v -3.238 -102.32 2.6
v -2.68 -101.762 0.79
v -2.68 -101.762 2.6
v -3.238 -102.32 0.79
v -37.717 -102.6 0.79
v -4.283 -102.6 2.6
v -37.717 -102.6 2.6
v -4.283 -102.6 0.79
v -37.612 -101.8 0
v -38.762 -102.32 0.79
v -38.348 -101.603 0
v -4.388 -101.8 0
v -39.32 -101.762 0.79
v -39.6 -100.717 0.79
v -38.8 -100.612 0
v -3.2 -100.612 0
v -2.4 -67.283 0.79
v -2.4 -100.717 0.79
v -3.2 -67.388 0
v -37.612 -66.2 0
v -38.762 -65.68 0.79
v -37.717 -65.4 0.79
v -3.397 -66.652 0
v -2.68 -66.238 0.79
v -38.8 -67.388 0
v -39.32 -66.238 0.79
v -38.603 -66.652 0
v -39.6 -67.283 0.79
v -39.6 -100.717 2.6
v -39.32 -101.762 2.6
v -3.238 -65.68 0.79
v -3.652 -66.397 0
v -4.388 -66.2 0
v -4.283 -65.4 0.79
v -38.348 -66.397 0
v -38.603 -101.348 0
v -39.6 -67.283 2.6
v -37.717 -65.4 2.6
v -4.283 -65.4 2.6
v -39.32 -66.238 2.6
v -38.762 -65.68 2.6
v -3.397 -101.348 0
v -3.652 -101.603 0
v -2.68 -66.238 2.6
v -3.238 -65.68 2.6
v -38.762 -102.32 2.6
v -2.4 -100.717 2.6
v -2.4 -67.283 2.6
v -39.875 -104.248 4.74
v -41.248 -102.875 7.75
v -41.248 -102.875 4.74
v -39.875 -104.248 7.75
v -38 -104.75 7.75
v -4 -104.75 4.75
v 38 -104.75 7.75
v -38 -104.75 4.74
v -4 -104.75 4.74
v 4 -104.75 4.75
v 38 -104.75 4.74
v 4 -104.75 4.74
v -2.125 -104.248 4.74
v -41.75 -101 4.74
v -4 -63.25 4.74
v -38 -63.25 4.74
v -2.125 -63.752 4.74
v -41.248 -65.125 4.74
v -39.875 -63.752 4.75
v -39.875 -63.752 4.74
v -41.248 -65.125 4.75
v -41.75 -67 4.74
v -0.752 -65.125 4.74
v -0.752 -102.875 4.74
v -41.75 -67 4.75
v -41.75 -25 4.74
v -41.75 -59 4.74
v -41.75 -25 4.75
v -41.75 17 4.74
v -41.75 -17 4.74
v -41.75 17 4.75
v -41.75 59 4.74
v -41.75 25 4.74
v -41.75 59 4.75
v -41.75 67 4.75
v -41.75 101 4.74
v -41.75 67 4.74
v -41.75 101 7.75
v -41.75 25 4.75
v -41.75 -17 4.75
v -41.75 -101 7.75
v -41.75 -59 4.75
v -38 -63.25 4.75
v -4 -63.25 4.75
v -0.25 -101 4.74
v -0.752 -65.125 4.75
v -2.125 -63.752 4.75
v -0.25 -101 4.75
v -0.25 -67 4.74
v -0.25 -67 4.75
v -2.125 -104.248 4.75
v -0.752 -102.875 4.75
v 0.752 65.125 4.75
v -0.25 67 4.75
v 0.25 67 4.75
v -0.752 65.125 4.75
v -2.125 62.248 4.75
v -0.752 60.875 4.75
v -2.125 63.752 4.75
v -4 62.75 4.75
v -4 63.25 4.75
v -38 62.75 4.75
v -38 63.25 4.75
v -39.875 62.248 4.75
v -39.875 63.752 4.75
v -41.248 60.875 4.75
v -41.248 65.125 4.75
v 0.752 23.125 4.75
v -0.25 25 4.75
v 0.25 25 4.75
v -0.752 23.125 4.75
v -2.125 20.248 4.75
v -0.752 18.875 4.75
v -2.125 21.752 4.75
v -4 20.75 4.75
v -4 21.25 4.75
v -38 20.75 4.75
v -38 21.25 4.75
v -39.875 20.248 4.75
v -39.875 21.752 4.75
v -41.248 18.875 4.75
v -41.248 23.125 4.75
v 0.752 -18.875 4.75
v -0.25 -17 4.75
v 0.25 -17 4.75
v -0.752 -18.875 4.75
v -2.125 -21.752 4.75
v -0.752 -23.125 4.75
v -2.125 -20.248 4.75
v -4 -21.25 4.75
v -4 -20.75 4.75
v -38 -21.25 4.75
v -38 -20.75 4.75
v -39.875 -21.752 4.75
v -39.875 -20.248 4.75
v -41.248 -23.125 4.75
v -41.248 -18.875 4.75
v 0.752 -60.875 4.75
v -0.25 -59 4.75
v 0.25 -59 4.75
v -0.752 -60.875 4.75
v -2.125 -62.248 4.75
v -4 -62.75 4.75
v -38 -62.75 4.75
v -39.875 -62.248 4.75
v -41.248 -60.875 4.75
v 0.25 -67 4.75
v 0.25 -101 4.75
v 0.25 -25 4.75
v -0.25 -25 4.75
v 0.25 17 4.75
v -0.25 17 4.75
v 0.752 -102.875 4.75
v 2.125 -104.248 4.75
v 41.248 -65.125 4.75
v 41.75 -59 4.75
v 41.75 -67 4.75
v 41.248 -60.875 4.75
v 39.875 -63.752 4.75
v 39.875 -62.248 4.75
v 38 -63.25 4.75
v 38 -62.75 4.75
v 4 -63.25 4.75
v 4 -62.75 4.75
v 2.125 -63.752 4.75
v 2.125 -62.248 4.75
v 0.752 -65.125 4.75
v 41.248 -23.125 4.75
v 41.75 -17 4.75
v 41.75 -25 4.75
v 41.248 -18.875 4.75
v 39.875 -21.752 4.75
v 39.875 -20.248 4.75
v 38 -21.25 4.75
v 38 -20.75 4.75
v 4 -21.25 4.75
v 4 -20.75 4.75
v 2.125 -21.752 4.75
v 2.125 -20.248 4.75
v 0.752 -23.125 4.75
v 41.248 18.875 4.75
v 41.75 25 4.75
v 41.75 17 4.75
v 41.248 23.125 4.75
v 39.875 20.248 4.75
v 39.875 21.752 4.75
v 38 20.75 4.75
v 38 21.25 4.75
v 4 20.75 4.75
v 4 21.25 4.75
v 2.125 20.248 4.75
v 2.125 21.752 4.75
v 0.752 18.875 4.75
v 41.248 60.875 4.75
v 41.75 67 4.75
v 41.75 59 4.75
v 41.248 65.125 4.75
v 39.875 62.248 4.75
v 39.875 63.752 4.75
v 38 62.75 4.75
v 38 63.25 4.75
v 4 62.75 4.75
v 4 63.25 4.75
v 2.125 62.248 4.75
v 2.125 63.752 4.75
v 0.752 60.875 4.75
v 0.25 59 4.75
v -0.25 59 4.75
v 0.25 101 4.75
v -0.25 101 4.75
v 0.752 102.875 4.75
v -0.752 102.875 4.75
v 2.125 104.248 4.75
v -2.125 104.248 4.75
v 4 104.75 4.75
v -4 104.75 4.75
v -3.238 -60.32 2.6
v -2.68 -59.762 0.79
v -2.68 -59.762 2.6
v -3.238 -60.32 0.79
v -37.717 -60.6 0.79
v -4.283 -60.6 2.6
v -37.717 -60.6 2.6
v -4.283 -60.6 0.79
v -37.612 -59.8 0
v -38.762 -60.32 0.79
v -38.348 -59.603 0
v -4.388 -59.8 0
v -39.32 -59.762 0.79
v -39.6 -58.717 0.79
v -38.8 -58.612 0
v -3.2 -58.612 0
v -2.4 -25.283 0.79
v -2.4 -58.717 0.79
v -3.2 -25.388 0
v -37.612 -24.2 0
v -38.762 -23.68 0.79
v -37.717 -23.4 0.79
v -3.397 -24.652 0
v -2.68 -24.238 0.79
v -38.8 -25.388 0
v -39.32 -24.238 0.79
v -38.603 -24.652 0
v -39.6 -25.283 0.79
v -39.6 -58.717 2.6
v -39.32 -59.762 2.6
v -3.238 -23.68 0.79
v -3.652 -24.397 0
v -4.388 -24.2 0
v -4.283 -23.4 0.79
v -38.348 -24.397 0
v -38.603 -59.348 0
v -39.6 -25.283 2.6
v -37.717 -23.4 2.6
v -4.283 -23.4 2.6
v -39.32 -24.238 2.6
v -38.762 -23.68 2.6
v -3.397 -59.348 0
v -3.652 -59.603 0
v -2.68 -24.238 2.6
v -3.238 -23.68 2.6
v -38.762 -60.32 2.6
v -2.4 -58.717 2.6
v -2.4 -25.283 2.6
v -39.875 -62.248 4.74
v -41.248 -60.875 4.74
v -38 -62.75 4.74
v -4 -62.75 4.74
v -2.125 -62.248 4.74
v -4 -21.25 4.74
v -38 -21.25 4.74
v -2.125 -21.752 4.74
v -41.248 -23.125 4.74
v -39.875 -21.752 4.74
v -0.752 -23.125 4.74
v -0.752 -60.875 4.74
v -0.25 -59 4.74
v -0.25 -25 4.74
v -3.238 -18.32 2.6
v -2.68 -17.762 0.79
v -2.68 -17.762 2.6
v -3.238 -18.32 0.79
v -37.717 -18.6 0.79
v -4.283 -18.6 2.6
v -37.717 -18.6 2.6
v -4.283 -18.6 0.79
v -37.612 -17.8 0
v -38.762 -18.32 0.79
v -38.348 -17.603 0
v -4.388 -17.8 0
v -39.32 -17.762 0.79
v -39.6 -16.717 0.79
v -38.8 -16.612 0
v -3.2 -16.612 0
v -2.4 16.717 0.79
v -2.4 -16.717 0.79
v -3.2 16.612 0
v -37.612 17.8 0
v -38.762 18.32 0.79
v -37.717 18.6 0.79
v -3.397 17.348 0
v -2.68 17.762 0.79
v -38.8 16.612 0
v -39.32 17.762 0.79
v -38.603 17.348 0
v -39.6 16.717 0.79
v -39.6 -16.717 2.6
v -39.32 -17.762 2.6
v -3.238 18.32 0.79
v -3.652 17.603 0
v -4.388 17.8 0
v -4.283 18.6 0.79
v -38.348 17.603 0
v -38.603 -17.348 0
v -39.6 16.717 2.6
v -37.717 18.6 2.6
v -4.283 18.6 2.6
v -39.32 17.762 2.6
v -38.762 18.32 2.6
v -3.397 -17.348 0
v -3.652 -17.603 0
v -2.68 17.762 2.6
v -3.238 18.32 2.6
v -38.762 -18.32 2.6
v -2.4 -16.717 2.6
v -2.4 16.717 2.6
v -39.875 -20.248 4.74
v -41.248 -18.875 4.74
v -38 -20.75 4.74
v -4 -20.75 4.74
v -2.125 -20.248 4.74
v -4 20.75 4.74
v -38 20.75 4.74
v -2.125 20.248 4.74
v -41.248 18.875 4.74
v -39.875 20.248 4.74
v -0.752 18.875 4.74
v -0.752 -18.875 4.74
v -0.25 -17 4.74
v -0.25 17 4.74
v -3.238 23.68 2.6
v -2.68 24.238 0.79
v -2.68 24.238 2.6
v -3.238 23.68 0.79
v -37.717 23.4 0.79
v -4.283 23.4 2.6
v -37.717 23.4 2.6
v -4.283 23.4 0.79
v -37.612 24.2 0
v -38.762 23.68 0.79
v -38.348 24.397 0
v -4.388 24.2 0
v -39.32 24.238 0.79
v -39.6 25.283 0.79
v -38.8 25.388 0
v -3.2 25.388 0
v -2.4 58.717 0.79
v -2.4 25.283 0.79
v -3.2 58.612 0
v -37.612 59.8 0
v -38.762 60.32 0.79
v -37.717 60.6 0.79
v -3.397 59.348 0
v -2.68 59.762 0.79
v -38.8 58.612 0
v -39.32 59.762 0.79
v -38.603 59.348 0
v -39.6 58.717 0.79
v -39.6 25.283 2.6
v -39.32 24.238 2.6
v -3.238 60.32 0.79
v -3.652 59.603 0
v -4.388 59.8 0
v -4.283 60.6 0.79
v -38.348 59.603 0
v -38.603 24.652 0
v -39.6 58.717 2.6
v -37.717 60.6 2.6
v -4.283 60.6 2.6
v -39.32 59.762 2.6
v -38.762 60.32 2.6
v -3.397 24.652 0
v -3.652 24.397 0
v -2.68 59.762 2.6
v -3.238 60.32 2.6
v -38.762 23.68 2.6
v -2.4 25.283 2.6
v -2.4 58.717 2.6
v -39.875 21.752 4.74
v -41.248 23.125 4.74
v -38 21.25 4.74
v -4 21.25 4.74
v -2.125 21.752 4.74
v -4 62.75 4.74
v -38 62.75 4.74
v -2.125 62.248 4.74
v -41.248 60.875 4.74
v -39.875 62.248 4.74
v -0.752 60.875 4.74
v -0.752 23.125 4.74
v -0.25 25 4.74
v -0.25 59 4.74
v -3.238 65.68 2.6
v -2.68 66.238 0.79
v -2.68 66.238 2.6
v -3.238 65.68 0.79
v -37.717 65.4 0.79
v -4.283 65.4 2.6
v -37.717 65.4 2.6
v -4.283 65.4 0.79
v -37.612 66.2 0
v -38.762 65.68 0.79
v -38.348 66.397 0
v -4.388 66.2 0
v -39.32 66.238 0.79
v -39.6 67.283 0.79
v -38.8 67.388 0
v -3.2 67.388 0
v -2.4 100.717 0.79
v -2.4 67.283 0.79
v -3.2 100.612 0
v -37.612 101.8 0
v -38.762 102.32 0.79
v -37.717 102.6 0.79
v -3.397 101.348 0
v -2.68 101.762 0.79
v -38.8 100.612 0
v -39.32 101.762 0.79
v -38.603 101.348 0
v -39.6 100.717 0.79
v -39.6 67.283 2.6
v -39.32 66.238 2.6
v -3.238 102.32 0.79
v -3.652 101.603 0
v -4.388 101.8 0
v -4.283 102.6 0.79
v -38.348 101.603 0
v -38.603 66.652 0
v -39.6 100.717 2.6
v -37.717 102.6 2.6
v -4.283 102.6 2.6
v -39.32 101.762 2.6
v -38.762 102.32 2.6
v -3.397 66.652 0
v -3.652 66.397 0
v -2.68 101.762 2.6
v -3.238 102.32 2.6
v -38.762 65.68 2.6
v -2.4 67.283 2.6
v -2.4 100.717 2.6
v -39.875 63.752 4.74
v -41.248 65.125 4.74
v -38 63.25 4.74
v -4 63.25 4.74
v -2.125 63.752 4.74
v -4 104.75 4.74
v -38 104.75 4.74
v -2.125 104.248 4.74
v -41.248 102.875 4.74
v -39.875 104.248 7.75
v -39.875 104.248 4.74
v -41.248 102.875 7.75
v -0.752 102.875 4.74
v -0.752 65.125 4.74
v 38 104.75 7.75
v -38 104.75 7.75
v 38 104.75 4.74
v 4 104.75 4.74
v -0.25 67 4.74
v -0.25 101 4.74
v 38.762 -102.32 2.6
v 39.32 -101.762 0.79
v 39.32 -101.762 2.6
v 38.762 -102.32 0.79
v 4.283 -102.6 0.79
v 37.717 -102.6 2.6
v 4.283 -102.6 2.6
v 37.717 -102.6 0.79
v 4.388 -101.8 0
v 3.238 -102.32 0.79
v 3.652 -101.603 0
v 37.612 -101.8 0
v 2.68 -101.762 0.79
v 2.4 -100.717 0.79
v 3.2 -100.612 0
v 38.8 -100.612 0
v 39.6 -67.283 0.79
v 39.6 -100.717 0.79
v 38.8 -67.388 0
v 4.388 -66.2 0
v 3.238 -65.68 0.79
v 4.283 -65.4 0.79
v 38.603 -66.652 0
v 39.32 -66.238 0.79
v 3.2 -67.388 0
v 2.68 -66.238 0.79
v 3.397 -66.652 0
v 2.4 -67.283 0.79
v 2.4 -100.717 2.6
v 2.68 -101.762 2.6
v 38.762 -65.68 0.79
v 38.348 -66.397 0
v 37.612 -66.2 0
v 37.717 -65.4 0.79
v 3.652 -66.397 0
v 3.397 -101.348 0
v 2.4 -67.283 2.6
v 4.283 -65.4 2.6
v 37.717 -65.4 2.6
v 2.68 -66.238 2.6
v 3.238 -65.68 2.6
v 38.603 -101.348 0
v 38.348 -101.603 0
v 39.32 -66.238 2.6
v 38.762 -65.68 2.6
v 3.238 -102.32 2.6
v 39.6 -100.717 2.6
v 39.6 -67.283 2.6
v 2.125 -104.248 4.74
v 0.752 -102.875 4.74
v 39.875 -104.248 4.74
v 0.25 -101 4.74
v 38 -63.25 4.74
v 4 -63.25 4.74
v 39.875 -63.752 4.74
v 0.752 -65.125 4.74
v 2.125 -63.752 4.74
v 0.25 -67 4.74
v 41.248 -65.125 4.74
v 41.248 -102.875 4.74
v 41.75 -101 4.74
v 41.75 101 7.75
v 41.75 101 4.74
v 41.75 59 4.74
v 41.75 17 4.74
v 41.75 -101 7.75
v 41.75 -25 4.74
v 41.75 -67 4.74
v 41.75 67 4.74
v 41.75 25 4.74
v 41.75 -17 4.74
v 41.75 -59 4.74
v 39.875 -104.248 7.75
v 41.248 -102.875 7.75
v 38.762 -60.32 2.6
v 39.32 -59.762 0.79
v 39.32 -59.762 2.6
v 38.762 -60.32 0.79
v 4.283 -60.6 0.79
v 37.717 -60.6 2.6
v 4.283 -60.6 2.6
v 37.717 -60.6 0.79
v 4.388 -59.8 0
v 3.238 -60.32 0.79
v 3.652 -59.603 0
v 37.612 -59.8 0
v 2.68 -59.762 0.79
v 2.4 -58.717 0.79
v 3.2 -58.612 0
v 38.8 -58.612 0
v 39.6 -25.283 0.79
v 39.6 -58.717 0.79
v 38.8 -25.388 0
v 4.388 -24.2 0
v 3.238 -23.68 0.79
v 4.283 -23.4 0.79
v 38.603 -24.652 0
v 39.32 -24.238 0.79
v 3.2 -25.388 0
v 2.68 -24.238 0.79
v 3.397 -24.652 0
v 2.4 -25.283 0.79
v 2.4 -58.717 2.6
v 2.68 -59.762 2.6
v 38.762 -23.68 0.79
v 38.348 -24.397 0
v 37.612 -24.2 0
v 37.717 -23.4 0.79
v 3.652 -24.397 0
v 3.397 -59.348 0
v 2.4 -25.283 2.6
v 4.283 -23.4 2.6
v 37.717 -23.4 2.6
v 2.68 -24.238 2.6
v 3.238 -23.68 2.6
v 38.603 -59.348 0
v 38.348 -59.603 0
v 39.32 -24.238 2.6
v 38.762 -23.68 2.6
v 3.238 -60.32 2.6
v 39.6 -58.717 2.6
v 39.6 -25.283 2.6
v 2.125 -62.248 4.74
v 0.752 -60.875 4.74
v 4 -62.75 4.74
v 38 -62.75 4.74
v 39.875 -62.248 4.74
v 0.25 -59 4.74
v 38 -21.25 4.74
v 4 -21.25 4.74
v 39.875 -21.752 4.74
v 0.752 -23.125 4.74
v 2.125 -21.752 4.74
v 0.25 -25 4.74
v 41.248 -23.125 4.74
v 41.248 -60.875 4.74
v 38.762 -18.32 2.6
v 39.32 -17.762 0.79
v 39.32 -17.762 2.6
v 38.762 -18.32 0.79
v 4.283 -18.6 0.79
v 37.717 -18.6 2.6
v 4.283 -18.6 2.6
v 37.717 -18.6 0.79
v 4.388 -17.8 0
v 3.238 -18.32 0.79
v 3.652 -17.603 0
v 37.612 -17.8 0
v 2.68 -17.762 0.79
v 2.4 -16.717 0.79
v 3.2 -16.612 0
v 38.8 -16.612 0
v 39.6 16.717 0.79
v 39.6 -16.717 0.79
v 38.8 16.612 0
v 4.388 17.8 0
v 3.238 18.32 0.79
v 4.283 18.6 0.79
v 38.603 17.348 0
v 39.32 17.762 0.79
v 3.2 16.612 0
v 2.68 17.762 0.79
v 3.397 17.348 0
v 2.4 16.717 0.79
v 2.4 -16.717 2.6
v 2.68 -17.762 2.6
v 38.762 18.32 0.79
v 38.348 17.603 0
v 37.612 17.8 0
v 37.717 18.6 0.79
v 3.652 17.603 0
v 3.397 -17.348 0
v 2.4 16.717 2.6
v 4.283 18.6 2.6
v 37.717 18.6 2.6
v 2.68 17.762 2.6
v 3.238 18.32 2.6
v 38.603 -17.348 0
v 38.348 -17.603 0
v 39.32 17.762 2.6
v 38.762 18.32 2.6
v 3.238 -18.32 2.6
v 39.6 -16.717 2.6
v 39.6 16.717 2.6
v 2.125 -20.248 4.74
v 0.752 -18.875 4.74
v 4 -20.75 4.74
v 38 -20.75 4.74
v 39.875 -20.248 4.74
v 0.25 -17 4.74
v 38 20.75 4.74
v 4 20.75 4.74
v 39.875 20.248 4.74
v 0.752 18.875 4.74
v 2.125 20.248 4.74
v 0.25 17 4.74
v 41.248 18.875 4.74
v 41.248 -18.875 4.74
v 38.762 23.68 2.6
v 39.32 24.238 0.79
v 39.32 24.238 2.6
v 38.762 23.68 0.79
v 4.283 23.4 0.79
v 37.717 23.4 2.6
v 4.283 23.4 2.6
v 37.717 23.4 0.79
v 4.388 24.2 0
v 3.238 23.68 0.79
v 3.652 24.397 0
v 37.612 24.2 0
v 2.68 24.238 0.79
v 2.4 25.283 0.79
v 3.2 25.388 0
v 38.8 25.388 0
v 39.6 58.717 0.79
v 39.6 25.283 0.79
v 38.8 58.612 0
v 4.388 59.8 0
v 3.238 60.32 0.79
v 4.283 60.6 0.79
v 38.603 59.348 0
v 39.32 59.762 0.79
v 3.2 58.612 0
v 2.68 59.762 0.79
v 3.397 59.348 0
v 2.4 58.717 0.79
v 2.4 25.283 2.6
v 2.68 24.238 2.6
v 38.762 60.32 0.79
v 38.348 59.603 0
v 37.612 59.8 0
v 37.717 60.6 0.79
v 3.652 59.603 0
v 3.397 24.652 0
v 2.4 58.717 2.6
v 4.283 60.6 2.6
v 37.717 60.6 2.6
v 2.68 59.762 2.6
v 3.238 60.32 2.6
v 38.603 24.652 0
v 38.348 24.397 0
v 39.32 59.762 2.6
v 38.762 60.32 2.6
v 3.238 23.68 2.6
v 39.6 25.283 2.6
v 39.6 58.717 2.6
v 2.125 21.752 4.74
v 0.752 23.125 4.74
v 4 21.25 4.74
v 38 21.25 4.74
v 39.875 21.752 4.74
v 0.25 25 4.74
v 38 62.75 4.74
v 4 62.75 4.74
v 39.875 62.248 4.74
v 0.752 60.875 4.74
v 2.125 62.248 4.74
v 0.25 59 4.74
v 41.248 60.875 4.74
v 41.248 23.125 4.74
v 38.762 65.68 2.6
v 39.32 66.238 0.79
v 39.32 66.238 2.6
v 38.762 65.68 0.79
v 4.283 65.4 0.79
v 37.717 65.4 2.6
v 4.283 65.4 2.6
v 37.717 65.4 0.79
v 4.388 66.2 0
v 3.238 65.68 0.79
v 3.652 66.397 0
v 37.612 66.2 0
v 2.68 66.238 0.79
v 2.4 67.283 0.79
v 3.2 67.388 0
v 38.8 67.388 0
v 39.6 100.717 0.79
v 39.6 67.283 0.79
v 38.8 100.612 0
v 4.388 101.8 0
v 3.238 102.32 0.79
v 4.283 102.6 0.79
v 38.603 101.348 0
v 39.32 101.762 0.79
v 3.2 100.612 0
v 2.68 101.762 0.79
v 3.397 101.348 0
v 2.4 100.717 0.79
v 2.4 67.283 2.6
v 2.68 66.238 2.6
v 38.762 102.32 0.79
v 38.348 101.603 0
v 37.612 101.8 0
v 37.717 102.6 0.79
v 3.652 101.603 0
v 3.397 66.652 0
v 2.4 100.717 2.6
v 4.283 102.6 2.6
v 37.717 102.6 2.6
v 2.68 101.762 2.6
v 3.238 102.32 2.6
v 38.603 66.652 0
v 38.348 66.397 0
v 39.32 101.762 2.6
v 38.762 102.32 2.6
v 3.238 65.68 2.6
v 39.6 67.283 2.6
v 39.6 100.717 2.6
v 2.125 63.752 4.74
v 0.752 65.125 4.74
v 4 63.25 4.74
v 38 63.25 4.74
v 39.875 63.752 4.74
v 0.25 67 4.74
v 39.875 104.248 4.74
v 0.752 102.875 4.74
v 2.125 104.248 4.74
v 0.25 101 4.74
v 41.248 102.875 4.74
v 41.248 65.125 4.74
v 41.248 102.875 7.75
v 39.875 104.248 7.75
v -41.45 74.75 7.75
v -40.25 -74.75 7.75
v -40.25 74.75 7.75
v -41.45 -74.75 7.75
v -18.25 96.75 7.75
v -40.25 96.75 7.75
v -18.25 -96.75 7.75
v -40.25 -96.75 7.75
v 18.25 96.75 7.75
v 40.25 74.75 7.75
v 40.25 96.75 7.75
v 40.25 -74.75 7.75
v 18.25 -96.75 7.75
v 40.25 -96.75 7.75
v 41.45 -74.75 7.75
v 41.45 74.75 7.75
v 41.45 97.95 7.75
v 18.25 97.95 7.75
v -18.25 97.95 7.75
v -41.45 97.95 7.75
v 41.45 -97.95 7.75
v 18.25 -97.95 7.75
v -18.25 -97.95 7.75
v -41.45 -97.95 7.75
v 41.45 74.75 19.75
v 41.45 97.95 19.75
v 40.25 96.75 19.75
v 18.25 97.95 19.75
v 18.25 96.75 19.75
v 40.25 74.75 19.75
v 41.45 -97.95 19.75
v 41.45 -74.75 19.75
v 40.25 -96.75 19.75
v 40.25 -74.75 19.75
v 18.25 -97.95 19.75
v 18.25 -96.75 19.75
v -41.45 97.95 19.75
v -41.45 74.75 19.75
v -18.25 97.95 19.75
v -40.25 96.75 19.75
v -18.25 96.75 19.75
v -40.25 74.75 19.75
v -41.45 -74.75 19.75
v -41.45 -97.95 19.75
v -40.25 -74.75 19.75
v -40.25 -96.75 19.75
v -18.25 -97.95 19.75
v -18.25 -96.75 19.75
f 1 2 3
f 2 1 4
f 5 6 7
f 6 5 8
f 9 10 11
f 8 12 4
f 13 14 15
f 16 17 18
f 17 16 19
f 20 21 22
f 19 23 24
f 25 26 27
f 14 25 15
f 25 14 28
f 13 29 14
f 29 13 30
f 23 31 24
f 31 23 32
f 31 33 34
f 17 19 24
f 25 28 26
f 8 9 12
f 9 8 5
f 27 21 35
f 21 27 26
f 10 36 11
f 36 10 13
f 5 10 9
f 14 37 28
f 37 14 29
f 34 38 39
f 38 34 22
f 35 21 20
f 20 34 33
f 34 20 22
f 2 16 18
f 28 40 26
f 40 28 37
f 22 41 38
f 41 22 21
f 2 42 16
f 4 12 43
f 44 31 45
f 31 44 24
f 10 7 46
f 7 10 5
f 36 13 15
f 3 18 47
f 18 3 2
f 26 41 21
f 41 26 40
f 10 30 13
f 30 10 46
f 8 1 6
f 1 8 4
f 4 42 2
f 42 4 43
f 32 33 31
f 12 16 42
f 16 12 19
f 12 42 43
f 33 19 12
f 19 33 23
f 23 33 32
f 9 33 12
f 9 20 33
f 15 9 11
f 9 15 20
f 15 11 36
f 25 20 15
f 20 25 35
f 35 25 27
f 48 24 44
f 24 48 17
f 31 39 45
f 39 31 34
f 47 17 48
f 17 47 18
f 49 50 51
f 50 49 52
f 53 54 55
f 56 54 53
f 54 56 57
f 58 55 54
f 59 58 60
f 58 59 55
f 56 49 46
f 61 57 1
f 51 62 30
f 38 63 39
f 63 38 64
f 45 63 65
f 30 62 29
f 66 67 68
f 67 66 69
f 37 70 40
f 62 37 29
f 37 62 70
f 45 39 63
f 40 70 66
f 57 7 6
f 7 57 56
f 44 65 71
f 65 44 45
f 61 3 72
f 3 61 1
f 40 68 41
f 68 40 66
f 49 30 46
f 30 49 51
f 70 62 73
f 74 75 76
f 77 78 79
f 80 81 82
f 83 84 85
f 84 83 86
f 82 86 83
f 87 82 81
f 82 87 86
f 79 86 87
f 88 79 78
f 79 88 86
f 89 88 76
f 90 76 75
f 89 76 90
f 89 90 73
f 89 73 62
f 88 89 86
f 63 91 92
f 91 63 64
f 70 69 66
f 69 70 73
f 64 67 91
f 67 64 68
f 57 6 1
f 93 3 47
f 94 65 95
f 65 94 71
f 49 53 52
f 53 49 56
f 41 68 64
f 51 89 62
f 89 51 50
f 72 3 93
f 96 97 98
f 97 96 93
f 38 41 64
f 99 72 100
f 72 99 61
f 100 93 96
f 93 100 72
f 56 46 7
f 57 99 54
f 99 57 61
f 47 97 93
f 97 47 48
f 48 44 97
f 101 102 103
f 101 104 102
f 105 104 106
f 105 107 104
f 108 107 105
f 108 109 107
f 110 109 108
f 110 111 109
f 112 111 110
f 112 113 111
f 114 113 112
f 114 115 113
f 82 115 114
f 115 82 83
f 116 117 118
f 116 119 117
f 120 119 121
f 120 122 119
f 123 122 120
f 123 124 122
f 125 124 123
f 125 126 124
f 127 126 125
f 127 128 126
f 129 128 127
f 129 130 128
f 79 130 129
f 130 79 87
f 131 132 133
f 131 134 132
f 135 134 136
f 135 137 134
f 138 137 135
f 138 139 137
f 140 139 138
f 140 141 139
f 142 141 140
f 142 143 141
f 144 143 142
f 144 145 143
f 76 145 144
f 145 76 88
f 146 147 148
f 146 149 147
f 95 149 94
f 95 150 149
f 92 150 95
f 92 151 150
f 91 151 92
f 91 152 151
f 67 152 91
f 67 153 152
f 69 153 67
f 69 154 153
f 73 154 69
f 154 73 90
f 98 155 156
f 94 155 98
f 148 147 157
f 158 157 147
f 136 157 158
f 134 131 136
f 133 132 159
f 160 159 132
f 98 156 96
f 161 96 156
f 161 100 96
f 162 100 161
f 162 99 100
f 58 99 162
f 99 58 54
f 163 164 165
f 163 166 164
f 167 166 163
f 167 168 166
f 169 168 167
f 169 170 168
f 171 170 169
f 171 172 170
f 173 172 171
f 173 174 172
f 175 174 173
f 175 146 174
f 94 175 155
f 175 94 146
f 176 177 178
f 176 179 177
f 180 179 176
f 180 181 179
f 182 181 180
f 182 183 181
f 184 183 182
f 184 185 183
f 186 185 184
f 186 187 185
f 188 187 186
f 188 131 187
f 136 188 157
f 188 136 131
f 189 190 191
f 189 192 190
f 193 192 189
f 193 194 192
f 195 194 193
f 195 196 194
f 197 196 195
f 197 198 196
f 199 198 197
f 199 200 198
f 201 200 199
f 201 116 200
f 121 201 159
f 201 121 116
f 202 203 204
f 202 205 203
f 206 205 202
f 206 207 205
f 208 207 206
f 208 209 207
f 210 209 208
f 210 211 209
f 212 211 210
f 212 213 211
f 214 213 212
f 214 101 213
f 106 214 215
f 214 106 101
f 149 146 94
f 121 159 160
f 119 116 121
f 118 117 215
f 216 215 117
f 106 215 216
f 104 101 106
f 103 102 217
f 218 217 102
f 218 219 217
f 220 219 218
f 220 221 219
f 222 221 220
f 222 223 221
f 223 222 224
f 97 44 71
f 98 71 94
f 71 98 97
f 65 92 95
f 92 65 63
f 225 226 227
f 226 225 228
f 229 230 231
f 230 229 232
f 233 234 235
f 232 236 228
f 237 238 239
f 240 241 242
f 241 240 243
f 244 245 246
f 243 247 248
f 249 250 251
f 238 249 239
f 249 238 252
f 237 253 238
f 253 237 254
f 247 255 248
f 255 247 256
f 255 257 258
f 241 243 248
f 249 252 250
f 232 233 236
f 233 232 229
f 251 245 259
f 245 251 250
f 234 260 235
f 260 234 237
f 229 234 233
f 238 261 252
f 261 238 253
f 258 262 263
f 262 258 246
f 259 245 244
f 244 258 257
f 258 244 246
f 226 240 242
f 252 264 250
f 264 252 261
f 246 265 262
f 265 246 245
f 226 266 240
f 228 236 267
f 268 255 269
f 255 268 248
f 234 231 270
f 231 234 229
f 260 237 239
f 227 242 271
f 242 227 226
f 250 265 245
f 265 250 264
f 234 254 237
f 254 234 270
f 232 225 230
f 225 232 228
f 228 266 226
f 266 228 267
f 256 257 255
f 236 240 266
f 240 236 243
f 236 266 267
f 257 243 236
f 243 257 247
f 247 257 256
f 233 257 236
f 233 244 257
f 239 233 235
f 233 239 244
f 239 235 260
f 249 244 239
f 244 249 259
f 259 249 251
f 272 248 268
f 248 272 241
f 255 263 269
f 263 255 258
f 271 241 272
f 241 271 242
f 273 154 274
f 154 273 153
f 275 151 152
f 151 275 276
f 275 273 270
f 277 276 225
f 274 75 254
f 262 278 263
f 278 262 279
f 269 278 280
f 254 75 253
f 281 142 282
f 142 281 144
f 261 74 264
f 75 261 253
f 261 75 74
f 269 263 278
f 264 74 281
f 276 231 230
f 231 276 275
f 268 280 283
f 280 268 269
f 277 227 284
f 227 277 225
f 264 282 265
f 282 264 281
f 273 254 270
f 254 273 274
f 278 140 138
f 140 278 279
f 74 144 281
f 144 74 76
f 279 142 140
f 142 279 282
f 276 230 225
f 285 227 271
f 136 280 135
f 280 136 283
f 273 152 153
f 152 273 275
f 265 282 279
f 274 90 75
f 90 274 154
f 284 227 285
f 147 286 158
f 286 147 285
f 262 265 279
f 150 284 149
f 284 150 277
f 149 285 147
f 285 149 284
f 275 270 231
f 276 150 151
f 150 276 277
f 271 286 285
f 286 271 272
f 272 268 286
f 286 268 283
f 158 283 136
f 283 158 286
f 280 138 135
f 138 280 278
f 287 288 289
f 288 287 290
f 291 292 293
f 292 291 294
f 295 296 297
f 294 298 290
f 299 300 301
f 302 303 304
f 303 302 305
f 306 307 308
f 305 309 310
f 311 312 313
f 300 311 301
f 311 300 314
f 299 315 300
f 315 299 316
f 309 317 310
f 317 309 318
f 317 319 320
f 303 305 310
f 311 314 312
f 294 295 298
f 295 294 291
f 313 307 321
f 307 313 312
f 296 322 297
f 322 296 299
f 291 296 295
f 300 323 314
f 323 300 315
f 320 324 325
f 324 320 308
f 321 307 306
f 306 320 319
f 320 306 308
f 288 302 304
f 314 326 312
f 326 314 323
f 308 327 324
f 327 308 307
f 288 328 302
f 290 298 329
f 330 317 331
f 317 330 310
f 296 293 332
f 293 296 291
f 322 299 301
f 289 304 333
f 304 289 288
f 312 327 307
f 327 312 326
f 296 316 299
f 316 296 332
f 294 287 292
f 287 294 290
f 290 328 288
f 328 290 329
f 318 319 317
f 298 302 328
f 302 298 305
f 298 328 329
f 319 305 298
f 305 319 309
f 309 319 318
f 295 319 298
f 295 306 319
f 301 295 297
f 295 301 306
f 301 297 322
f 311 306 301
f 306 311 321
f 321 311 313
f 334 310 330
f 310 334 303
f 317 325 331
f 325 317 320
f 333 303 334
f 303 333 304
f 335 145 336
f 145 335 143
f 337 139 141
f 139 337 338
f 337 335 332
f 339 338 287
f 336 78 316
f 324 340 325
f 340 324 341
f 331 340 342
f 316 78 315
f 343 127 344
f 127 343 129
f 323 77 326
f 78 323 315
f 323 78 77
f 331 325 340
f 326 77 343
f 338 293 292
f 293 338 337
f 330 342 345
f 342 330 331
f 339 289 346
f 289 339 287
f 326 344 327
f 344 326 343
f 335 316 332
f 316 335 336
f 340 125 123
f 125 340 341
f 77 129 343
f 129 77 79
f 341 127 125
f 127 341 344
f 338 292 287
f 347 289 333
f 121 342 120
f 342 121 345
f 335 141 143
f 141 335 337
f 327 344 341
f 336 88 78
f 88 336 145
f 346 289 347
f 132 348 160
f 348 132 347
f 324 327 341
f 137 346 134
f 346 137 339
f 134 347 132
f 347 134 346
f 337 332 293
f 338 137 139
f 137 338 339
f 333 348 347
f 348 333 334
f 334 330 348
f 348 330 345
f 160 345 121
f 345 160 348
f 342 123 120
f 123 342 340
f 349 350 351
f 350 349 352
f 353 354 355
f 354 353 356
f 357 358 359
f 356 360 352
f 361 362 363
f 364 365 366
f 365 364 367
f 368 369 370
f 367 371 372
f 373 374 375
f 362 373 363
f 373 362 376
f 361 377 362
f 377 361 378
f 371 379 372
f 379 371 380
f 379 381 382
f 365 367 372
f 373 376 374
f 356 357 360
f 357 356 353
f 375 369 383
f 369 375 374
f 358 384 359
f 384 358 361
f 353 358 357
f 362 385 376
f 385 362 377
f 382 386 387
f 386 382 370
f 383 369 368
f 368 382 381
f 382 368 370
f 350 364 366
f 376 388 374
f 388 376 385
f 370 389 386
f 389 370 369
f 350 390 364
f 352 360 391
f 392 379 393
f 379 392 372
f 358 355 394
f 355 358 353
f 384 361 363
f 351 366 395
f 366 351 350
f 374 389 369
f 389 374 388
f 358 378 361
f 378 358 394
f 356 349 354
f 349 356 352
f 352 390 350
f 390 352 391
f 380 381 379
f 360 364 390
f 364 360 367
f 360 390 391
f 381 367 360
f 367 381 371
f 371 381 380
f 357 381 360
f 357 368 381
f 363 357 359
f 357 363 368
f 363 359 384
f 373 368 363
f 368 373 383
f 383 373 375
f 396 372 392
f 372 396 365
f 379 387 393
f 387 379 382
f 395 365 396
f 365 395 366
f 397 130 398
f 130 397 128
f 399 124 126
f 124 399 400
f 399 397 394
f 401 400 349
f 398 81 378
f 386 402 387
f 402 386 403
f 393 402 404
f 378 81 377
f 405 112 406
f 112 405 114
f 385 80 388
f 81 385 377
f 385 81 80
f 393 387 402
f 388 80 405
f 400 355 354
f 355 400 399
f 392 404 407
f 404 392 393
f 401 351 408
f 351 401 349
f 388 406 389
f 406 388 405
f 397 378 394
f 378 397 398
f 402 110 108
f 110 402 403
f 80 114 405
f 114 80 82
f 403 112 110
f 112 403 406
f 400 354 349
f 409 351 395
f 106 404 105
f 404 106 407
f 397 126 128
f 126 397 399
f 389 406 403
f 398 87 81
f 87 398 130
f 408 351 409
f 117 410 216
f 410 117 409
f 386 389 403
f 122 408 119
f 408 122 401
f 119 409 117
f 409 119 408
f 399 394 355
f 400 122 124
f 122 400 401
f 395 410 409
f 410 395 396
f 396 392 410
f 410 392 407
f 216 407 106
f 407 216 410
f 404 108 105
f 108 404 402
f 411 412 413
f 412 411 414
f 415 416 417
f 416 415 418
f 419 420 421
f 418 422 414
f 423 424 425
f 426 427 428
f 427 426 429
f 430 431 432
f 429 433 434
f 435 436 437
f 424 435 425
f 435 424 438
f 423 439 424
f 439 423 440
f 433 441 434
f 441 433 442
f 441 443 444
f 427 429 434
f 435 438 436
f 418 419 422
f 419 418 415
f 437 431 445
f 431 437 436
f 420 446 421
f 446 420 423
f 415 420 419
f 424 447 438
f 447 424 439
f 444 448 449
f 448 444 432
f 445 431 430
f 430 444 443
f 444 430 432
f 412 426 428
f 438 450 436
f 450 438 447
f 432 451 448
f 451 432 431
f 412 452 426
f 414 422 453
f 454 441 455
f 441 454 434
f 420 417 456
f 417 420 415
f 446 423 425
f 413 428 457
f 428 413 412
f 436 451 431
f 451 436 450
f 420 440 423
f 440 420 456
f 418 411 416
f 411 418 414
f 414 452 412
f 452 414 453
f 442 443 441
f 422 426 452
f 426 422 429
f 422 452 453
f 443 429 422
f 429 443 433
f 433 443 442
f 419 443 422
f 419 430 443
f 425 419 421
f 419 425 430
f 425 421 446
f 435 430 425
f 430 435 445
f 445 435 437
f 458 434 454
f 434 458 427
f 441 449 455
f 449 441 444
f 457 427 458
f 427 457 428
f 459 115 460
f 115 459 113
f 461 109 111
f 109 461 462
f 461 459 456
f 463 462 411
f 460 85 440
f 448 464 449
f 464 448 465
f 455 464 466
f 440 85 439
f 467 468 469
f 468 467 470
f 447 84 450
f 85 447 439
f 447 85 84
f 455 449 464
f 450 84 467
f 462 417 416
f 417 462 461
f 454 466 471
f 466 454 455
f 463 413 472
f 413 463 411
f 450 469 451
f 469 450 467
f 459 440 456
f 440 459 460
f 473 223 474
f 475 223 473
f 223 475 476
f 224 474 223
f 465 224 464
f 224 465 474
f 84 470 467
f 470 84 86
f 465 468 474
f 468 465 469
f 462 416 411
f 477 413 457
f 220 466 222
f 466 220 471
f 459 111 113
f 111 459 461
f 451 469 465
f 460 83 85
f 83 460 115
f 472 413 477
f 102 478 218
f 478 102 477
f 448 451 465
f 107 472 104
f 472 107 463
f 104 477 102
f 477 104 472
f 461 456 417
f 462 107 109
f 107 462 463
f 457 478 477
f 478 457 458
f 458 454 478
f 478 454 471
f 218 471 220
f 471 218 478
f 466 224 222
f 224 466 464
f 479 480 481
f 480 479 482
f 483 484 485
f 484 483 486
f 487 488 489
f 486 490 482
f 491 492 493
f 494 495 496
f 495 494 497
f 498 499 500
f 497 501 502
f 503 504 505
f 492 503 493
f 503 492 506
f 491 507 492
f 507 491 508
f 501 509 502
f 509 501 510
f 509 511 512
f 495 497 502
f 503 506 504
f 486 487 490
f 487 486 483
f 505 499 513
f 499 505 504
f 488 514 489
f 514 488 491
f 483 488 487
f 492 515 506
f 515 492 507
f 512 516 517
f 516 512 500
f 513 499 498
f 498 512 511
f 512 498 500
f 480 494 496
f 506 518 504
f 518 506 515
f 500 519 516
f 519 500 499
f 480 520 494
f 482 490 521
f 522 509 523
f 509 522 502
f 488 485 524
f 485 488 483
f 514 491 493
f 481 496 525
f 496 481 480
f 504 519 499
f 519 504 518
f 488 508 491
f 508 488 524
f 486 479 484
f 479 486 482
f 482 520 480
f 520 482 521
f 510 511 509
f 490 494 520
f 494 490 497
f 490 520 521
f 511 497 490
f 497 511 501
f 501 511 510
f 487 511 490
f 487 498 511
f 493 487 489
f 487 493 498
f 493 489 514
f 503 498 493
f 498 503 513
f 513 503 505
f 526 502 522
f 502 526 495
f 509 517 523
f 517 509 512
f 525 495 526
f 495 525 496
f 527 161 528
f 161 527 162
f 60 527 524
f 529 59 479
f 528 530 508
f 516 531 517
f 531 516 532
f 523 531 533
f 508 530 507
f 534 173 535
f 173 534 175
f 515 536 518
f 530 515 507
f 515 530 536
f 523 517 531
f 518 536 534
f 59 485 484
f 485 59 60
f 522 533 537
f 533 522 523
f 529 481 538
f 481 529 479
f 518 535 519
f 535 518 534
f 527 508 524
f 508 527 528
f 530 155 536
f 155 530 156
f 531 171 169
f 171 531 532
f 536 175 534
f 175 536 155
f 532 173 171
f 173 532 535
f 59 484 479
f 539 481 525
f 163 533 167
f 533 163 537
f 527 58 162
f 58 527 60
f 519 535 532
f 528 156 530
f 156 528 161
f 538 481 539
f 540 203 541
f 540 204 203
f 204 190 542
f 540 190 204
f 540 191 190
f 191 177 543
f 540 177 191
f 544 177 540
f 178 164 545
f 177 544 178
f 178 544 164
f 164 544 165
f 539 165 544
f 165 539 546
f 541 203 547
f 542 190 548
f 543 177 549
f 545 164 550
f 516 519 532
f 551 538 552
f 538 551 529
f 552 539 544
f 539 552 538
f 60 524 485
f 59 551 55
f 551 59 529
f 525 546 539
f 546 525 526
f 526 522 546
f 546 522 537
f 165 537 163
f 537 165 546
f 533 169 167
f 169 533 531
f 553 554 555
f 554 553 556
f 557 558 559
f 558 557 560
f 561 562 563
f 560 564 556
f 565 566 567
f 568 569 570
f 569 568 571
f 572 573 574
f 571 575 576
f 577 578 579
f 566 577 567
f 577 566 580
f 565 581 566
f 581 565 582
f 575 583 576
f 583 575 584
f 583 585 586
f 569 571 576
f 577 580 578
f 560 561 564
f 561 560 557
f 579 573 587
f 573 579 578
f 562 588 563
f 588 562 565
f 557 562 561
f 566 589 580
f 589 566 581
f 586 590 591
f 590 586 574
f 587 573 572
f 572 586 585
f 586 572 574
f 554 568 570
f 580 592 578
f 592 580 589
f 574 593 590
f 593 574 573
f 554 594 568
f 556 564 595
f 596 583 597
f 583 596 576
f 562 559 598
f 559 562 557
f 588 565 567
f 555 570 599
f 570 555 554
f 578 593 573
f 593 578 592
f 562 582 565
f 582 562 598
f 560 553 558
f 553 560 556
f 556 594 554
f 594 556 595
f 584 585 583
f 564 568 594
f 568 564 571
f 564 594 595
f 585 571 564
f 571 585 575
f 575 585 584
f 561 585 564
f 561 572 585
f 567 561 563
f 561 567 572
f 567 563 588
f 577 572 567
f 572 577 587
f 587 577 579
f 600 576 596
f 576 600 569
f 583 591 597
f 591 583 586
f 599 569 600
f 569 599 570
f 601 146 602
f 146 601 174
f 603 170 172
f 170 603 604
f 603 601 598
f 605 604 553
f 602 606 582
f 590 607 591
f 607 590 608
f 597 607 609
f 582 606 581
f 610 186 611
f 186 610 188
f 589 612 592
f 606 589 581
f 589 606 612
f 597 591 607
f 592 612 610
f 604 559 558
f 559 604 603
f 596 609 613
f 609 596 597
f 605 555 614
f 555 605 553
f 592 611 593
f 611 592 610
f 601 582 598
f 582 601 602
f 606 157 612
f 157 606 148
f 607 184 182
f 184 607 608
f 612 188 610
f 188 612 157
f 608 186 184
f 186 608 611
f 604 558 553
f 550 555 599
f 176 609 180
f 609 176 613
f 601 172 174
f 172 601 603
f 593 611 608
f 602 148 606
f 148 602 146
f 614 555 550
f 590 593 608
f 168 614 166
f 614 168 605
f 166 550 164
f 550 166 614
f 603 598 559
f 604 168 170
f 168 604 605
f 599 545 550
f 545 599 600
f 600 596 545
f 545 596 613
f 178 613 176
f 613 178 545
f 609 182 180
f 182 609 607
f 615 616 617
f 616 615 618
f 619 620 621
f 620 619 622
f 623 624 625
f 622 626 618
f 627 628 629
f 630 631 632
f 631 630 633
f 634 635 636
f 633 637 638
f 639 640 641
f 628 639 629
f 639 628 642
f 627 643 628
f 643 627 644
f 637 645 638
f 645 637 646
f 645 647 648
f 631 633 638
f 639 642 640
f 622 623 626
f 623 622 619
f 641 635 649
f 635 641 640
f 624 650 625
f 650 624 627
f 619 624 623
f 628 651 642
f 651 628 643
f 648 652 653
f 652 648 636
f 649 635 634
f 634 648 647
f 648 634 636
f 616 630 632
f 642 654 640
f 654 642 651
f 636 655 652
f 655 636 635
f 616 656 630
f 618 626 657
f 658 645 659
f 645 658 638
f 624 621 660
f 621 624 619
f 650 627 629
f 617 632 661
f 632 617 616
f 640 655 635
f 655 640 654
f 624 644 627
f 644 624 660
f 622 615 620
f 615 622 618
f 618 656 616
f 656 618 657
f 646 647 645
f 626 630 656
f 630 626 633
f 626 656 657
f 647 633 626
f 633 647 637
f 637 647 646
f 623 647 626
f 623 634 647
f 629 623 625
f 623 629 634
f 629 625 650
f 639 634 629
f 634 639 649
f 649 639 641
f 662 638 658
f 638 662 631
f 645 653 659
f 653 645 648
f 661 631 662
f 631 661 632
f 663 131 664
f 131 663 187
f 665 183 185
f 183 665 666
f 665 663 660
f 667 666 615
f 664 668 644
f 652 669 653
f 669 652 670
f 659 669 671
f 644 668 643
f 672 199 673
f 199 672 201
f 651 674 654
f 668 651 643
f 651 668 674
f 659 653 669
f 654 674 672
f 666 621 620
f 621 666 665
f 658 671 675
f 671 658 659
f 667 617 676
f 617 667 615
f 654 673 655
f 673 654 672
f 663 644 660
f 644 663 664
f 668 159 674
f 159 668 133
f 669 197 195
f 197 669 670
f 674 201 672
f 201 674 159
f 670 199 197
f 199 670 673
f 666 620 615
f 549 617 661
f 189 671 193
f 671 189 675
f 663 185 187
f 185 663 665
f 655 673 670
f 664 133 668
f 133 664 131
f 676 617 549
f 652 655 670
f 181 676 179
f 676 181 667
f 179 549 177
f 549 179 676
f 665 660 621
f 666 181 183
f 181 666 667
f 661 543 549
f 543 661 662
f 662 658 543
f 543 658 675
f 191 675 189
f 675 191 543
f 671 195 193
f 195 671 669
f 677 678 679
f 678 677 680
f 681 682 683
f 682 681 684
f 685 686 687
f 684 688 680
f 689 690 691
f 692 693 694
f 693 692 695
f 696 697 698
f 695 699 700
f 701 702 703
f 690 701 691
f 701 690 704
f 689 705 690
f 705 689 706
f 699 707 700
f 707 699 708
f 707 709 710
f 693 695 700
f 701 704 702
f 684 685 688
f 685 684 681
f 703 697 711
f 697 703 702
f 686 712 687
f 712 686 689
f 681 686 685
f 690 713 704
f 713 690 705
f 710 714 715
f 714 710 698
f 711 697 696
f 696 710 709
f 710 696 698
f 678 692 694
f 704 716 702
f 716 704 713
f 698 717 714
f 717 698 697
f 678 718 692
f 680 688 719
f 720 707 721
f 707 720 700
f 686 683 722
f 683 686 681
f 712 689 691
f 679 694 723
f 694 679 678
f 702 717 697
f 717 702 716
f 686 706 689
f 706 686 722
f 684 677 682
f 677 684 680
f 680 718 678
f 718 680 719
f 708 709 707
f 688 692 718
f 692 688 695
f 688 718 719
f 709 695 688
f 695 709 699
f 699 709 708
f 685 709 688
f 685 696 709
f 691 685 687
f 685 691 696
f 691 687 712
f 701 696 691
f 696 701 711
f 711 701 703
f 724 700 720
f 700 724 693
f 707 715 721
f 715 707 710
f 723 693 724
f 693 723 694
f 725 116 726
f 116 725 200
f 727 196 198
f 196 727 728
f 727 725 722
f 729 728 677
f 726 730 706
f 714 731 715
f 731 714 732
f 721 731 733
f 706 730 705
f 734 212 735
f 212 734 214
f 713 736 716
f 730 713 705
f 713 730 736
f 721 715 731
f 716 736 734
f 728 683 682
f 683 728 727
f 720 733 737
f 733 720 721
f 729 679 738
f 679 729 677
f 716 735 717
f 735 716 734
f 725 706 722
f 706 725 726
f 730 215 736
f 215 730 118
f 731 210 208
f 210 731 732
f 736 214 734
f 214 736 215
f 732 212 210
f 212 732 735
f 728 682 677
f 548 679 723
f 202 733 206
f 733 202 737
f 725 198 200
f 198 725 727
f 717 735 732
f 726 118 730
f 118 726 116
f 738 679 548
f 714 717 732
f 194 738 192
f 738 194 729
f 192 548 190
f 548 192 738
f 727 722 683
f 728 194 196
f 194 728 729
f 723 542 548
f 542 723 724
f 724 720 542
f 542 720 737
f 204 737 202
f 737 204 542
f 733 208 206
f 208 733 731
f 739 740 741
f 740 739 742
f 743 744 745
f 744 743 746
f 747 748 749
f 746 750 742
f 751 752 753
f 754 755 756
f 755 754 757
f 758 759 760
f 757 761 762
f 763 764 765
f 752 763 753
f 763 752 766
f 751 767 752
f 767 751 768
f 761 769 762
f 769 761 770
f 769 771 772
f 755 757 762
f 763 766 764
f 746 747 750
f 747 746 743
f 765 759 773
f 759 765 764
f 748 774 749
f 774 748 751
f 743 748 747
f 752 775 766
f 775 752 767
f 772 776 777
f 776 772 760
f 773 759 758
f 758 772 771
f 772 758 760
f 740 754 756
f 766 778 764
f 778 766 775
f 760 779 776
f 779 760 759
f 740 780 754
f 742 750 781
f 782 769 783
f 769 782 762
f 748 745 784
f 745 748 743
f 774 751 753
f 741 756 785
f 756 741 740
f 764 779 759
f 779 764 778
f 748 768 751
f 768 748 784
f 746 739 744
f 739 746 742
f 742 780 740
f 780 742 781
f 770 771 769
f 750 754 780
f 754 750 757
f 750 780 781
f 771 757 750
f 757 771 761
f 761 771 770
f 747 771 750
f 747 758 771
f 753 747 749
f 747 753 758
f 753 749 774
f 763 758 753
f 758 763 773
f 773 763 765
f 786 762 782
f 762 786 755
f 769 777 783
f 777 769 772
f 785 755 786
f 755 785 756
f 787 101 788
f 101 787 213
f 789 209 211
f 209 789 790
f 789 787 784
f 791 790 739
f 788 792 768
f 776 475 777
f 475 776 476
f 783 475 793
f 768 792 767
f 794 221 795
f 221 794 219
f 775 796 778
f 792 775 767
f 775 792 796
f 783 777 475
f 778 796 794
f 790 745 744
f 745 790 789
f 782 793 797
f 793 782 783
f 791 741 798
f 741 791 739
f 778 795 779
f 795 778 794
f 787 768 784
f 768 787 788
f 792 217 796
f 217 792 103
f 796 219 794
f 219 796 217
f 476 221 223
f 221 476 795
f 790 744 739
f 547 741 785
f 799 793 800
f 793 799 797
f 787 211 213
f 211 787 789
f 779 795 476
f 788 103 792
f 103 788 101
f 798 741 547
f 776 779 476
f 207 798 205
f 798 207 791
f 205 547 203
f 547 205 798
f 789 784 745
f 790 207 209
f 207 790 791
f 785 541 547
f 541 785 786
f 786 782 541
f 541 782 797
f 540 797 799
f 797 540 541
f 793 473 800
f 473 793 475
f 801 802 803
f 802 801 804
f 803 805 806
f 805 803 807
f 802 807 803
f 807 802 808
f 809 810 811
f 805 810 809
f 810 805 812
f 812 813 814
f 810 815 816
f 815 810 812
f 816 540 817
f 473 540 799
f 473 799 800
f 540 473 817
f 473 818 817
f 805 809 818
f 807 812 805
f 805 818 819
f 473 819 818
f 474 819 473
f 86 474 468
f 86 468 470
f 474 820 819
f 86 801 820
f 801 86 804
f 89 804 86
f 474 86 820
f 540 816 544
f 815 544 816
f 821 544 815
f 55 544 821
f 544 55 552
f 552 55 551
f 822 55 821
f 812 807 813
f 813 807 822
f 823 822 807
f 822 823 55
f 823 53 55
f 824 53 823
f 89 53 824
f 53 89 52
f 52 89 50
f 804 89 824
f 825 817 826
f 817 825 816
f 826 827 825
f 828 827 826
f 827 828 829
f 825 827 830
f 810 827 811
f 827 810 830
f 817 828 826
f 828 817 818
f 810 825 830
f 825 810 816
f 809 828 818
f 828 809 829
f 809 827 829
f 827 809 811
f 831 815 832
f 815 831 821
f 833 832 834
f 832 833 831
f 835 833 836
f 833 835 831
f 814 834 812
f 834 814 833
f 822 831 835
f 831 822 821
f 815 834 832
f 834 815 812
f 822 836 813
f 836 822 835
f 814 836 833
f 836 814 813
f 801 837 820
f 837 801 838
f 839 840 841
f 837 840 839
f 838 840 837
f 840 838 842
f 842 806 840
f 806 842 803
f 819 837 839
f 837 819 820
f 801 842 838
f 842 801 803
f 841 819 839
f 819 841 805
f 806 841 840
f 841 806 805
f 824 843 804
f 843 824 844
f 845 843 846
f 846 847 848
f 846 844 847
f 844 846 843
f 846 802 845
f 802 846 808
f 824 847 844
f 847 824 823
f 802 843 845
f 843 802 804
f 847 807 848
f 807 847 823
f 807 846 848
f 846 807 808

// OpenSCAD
// file: psu_locators_common.scad
// psu_locators_common — open corner locators that give each bench supply a fixed
// home on the Clickfinity grid without blocking airflow. A shallow Gridfinity-
// footed floor plate (clicks into the bench baseplate) with LOW corner nubs that
// capture the PSU footprint. No side/front/rear walls — both supplies vent from
// the sides (ENGINDOT: FULL-height both sides; OWON: low side slots + rear fan),
// so anything enclosing would choke them. Nubs only appear on an axis where
// there's clearance between the PSU edge and the plate edge.
//
// Dimensions reused from the existing top-tray models (NOT re-measured):
//   OWON SPM8104   84.30 W × 226 D   (owon_tray_common: lid 84.30, ~226 long)
//   ENGINDOT       80    W × 193 D   (shortkiller_common: measured 80 × 193)
include <../lib/gridfinity.scad>

NUB_T   = 1.2;   // corner-nub wall thickness (thin — only room on a narrow gap)
NUB_LEN = 22;    // how far the nub runs along each captured edge
NUB_H   = 12;    // nub height — low, well clear of any vents
CLR     = 0.5;   // slip clearance so the PSU drops between the nubs
FLOOR   = 3;     // floor plate thickness above the Gridfinity foot

// One corner's nubs, inner corner at origin, opening toward −x,−y. `xw`/`yw`
// switch each wall on only when the plate has room for it on that axis.
// WHEN BOTH WALLS EXIST THEY MUST OVERLAP, NOT MEET AT A POINT.
//
// Written as two cubes butted at the origin they touch along a single EDGE, and
// that edge ends up shared by four triangles — non-manifold. It only shows on
// locators where both walls are generated: the ENGINDOT has 1.50 mm of X margin
// against NUB_T 1.2 so it gets both and produced 4 bad edges, while the OWON has
// -0.65 and gets end walls only, so it rendered clean and hid the bug.
//
// Running the side wall up through the corner by NUB_T makes it a real L with
// volumetric overlap.
// The nubs also SINK into the plate rather than butting onto its top face. A nub
// standing exactly on z0 is a partial-area join at an exact plane, which leaves
// non-manifold edges along the nub's footprint — 2 of them survived the L fix
// above until the nubs were sunk. Exact-plane butting is for FULL-face joins.
NUB_SINK = 0.5;
module _corner(xw, yw) {
    if (xw) translate([0, -NUB_LEN, -NUB_SINK])
        cube([NUB_T, NUB_LEN + (yw ? NUB_T : 0), NUB_H + NUB_SINK]);   // side wall
    if (yw) translate([-NUB_LEN, 0, -NUB_SINK])
        cube([NUB_LEN, NUB_T, NUB_H + NUB_SINK]);                       // end wall
}

// Footed floor plate + up to 4 corner nubs sized to a pw × pd PSU footprint.
module psu_locator(nx, ny, pw, pd) {
    W = nx*GF - 0.5; D = ny*GF - 0.5;
    hx = (pw + CLR)/2; hy = (pd + CLR)/2;
    xw = (W/2 - hx) >= NUB_T;   // room for a side (x-blocking) wall?
    yw = (D/2 - hy) >= NUB_T;   // room for an end (y-blocking) wall?
    z0 = BIN_BASE_H + FLOOR;
    union() {
        bin_blank(nx, ny, z0);   // shallow Gridfinity-footed floor
        for (mx = [0,1]) for (my = [0,1])
            translate([(mx?-1:1)*hx, (my?-1:1)*hy, z0])
                mirror([mx,0,0]) mirror([0,my,0]) _corner(xw, yw);
    }
}
// main file
// engindot_locator — ENGINDOT bench PSU corner locator (80 × 193). 2×5 footprint.
// Full-height side vents → open sides; the thin corner nubs capture all 4 corners.
include <psu_locators_common.scad>
psu_locator(2, 5, 80, 193);
